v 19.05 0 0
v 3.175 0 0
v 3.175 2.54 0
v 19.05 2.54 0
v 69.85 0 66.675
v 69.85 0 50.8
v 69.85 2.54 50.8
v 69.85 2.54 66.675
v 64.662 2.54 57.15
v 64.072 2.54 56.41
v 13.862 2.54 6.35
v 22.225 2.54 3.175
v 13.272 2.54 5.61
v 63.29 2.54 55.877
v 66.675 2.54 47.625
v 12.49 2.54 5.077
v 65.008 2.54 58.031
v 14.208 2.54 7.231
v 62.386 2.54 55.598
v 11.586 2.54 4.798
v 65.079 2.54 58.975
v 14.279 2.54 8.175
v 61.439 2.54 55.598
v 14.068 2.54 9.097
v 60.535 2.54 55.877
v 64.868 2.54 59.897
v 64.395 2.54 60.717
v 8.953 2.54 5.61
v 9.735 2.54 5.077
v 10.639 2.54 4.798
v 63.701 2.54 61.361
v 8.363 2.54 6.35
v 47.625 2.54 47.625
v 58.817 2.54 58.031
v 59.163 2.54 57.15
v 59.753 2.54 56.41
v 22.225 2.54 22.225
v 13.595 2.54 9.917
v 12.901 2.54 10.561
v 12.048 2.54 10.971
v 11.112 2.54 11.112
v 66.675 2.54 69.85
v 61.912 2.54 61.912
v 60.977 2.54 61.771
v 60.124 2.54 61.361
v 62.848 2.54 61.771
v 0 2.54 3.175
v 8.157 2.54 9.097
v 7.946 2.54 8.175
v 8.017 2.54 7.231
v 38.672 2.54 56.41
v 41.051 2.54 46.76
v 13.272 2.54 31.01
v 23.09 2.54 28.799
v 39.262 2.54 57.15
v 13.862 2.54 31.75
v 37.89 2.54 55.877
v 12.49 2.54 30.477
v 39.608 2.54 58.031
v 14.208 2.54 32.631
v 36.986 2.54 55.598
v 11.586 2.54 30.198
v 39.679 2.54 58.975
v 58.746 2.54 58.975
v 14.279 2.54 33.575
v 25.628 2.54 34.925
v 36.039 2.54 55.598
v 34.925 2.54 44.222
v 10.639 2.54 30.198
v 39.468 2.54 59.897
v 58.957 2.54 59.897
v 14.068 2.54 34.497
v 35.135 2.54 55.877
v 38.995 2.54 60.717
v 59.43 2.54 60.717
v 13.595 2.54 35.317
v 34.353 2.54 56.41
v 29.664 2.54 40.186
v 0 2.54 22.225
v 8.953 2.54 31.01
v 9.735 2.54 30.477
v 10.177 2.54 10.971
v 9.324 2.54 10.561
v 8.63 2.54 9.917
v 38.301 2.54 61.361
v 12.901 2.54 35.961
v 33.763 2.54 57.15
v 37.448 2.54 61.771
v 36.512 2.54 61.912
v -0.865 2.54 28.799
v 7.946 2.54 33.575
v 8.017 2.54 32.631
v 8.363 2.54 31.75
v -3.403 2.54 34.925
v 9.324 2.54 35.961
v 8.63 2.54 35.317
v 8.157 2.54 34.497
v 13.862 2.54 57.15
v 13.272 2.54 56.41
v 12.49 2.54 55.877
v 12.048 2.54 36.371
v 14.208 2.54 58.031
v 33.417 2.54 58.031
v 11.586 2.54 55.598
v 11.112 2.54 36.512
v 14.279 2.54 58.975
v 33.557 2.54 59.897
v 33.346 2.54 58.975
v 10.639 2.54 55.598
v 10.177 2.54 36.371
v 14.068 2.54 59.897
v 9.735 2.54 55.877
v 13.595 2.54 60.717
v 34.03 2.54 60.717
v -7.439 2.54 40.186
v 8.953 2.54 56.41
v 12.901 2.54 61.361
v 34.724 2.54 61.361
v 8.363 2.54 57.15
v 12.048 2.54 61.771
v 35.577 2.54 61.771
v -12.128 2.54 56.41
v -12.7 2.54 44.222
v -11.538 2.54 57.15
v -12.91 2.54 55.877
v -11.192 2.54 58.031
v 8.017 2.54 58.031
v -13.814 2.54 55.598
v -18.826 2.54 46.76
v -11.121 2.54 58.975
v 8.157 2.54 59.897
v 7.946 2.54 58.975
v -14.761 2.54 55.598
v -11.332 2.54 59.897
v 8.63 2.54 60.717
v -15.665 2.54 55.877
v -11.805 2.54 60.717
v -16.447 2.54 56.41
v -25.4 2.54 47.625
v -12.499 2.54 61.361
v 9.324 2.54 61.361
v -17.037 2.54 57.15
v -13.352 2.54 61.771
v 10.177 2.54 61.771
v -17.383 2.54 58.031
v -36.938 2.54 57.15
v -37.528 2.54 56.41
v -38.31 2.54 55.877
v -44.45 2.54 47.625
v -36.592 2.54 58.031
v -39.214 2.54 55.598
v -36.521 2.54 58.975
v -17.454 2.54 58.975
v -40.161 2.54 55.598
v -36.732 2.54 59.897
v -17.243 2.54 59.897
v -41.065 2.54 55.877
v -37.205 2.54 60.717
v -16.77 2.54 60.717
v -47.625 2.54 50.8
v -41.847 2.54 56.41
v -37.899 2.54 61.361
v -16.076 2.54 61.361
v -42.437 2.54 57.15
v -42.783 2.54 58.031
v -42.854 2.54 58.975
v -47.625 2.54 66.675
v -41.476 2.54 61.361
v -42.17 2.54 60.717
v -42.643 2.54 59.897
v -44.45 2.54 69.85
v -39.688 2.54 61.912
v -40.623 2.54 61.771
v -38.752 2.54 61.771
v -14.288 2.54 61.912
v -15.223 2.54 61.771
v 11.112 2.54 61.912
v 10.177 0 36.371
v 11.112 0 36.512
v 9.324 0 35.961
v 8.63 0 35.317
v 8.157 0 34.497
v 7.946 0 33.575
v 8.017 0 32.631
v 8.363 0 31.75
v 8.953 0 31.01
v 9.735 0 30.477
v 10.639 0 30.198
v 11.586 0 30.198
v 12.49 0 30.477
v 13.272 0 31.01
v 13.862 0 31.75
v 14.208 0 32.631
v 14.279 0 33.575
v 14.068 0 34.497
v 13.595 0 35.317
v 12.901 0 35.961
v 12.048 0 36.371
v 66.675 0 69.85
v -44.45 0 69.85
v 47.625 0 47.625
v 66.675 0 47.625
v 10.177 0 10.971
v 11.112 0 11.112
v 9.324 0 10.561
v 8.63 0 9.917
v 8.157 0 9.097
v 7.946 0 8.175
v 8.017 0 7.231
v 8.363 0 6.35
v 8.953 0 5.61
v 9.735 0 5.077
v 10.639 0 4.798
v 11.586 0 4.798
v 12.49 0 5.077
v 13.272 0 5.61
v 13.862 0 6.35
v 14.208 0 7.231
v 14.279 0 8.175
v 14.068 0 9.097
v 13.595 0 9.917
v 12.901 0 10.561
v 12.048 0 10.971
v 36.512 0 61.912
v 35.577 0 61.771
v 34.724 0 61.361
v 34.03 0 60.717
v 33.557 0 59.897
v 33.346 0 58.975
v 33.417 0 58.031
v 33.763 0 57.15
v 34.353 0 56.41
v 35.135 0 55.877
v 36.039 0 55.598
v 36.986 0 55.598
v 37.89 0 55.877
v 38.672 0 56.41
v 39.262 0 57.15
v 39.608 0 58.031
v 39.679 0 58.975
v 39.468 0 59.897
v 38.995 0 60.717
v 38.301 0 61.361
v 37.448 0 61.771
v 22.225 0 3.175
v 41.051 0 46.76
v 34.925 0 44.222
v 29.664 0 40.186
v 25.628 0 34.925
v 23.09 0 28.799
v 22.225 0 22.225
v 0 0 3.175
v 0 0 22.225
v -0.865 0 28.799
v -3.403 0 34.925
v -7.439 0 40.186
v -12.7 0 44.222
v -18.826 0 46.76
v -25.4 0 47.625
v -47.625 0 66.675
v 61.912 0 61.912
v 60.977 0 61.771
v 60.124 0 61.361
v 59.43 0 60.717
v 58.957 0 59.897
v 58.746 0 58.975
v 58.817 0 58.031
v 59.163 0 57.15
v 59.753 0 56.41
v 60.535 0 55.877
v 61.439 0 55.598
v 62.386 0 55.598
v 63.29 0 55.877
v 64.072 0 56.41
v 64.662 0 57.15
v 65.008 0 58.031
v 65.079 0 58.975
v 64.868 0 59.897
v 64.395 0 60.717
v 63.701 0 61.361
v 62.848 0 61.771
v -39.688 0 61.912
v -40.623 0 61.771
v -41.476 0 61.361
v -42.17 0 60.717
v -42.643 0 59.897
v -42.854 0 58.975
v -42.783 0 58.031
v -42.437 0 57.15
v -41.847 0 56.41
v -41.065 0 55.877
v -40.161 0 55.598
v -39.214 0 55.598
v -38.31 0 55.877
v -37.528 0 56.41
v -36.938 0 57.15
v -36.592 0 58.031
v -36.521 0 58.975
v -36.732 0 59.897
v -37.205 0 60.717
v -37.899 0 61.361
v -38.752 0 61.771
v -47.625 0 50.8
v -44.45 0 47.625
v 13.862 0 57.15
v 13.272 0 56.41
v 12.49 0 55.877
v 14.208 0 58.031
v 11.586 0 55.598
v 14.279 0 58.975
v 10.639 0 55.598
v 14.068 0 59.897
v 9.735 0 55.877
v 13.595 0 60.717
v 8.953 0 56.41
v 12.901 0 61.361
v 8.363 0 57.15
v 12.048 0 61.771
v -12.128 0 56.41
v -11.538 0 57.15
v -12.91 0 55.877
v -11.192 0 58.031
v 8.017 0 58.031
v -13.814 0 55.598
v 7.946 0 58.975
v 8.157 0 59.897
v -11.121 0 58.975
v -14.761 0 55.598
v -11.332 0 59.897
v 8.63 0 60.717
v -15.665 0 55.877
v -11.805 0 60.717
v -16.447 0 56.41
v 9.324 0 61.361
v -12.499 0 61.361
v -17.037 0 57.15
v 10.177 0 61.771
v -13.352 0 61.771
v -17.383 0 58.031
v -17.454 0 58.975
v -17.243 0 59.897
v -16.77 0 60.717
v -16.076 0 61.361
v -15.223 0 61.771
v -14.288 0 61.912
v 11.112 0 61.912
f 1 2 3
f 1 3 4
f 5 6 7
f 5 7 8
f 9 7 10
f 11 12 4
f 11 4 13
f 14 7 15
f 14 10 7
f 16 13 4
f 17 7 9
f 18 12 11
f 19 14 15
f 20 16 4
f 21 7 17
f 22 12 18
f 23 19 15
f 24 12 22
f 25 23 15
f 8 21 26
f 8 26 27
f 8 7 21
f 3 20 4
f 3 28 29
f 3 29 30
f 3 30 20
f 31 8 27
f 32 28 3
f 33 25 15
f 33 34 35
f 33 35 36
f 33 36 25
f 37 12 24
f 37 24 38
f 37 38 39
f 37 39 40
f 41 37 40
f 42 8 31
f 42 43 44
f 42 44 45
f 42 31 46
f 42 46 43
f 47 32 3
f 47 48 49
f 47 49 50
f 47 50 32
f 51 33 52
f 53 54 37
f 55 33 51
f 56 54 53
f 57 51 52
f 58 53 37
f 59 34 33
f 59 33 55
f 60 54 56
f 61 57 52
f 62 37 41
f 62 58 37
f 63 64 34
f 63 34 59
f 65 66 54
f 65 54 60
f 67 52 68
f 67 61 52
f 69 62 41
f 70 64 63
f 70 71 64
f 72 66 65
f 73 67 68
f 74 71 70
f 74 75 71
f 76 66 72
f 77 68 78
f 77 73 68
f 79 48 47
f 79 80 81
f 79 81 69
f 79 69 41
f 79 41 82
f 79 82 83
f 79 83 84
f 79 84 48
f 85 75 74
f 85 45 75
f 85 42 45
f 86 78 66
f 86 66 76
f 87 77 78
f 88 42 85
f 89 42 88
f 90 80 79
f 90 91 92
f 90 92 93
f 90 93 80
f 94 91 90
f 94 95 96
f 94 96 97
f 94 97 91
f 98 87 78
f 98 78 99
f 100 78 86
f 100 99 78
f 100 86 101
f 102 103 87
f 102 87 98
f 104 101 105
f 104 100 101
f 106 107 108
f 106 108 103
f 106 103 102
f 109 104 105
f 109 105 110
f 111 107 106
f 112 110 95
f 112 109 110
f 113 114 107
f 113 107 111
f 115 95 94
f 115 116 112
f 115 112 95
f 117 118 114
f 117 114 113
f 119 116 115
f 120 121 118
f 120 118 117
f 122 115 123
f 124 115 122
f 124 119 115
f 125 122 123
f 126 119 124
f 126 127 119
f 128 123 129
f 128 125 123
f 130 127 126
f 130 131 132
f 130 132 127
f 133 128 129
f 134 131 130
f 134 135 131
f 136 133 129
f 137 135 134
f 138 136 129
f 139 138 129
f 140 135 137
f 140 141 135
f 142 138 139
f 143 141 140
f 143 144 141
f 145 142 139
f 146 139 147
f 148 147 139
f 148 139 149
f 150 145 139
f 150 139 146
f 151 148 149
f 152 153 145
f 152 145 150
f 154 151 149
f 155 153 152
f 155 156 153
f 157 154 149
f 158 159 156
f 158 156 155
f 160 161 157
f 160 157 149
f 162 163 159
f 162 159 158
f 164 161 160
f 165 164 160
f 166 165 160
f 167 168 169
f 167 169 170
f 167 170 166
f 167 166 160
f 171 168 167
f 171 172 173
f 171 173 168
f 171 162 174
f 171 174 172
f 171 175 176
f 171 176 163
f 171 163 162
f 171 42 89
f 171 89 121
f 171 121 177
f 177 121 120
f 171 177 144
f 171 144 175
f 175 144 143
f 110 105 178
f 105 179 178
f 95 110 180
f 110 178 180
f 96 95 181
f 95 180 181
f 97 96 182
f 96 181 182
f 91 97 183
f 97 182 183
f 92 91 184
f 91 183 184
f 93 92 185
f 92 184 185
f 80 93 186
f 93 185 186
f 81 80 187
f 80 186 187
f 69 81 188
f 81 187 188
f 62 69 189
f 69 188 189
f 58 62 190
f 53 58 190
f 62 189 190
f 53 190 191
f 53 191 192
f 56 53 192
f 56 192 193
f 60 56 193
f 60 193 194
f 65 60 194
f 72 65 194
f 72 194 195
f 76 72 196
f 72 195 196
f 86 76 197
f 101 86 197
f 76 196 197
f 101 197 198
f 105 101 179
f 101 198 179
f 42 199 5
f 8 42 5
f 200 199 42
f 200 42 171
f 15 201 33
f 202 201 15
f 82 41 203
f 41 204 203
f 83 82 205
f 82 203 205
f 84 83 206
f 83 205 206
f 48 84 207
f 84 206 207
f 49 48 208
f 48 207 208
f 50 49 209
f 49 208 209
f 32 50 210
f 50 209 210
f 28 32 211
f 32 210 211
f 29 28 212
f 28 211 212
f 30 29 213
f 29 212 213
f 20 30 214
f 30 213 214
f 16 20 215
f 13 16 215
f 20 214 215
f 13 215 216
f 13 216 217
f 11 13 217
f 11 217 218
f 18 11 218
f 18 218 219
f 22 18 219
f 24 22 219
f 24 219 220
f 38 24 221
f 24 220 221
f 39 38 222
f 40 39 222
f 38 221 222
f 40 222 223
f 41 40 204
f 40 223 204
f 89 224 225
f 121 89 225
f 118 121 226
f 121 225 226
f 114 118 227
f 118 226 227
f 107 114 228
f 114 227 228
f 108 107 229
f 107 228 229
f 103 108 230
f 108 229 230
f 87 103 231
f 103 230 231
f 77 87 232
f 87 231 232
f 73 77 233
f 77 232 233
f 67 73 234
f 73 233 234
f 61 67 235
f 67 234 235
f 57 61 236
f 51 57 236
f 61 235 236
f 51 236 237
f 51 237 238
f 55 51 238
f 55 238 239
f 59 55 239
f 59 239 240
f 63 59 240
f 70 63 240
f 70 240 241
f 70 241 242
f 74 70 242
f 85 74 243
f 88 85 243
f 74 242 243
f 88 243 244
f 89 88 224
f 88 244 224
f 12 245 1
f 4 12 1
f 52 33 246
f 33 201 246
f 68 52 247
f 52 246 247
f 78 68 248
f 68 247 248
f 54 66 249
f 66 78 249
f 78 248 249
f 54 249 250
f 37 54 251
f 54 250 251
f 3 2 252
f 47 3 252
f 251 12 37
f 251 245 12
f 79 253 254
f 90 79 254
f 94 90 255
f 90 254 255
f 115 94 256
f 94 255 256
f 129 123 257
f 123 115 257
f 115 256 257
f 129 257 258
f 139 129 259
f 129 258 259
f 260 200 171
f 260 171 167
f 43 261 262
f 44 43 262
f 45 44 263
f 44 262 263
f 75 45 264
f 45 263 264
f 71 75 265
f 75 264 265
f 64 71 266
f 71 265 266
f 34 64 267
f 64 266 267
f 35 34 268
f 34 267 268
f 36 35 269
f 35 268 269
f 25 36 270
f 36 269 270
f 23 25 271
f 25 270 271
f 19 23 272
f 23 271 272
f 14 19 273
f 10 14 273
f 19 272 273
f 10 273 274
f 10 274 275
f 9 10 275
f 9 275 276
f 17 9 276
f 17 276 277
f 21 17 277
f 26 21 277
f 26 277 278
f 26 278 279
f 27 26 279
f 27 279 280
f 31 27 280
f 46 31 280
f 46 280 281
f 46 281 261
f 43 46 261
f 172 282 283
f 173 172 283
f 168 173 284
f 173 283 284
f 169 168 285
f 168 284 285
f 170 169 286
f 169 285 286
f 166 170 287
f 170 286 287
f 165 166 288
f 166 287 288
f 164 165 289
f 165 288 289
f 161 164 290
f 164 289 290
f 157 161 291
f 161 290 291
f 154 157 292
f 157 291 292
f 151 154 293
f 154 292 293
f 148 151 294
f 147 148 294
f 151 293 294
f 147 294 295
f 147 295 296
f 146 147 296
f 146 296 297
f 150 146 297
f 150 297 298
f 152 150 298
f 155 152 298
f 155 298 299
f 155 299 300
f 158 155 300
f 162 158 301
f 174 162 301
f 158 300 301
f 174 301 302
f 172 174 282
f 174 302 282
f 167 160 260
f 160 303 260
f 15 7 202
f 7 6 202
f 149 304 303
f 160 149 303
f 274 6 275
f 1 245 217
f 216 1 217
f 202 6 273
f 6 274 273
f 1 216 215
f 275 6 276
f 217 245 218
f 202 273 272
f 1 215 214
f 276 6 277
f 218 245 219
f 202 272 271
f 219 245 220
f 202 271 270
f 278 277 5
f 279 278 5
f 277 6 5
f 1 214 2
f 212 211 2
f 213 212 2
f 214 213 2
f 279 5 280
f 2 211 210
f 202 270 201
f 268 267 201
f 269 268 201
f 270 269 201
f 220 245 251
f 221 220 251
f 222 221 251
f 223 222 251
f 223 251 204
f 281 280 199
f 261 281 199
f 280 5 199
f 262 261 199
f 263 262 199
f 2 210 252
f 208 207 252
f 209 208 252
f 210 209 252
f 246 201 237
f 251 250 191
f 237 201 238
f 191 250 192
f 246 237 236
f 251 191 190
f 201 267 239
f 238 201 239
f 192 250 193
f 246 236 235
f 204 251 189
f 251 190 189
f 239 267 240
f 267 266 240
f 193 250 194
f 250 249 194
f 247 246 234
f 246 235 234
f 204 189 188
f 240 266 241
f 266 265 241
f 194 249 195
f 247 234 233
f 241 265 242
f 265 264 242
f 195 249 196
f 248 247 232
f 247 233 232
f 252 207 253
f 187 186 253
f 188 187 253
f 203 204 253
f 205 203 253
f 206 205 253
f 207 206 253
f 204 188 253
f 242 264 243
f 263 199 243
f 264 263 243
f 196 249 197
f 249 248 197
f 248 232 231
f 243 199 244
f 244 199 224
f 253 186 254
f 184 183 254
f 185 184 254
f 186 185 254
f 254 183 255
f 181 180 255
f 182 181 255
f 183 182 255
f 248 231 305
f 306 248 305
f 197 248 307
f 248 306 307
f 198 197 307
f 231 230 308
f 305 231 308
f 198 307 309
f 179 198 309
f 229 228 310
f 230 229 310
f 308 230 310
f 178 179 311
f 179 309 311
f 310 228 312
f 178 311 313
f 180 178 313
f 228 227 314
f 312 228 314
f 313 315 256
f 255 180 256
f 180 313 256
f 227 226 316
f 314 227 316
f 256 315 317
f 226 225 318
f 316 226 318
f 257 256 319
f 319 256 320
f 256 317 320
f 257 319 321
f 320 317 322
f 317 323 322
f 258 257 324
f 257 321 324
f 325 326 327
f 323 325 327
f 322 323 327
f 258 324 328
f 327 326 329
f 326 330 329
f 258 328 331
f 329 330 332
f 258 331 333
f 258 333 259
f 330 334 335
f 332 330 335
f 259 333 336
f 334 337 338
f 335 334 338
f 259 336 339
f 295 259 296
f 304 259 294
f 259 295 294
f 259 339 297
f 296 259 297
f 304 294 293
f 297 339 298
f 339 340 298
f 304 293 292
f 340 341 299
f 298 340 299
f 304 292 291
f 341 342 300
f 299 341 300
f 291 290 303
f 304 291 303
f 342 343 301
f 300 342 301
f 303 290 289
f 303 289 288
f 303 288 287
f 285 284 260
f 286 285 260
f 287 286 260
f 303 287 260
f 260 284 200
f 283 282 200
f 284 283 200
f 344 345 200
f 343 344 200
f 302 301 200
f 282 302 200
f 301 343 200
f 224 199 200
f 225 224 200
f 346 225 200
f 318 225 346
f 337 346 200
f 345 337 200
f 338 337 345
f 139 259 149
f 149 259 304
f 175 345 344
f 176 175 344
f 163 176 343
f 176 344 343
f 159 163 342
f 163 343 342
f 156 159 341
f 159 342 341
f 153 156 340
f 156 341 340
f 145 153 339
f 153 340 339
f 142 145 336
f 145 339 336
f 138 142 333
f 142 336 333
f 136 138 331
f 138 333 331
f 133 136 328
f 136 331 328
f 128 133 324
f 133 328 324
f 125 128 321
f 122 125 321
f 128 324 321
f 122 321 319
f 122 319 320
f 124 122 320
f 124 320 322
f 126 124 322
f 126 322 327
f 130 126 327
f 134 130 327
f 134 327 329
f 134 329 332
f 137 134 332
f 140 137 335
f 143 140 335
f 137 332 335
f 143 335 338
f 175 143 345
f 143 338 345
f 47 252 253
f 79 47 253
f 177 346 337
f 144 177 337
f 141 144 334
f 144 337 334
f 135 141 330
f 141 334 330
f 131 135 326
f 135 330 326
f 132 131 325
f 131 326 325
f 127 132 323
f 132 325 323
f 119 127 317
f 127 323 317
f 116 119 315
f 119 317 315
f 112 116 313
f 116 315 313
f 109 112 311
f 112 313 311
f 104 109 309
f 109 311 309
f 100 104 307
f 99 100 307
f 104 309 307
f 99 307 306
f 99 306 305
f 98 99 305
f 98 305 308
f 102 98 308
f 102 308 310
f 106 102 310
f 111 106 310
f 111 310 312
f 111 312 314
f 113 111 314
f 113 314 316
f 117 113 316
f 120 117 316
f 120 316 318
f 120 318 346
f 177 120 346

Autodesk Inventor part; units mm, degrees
ref_plane "YZ Plane" through (0, 0, 0) normal (1, 0, 0) x (0, 1, 0)
ref_plane "XZ Plane" through (0, 0, 0) normal (0, 1, 0) x (-1, 0, 0)
ref_plane "XY Plane" through (0, 0, 0) normal (0, 0, 1) x (1, 0, 0)
sketch "Sketch1" plane through (0, 0, 0) normal (0, 1, 0) x (-1, 0, 0)
  line L0 (-3.175, 0) -> (-19.05, 0)
  line L1 (-69.85, 50.8) -> (-69.85, 66.675)
  line L2 (-66.675, 69.85) -> (44.45, 69.85)
  line L3 (-66.675, 69.85) -> (-69.85, 66.675)
  line L4 (-22.225, 3.175) -> (-22.225, 22.225)
  line L5 (-47.625, 47.625) -> (-66.675, 47.625)
  arc A0 (-22.225, 22.225) -> (-47.625, 47.625) centre (-47.625, 22.225) ccw
  line L6 (-22.225, 3.175) -> (-19.05, 0)
  line L7 (-69.85, 50.8) -> (-66.675, 47.625)
  line L8 (0, 3.175) -> (0, 22.225)
  line L9 (25.4, 47.625) -> (44.45, 47.625)
  line L10 (47.625, 50.8) -> (47.625, 66.675)
  arc A1 (25.4, 47.625) -> (0, 22.225) centre (25.4, 22.225) ccw
  line L11 (44.45, 69.85) -> (47.625, 66.675)
  line L12 (44.45, 47.625) -> (47.625, 50.8)
  line L13 (-3.175, 0) -> (0, 3.175)
  point P0 (0, 0)
  point P1 (-69.85, 69.85)
  point P2 (-3.175, 0)
  point P3 (0, 0)
  point P4 (-22.225, 47.625)
  point P5 (-22.225, 0)
  point P6 (-69.85, 47.625)
  point P7 (52.01, 70.1655)
  point P8 (52.01, 44.7655)
  point P9 (5.867, 46.0375)
  point P10 (5.867, 11.0567)
  point P11 (0, 47.625)
  point P12 (41.275, 47.625)
  point P13 (47.625, 44.45)
  point P14 (47.625, 63.5)
  point P15 (47.625, 69.85)
  point P16 (47.625, 47.625)
  point P17 (0, 0)
  dimension "d6" = 3.175
  dimension "d7" = 3.175
  dimension "d10" = 25.4
  dimension "d11" = 3.175
  dimension "d12" = 3.175
  dimension "d13" = 3.175
  dimension "d14" = 3.175
  dimension "d39" = 19.05
  dimension "d40" = 19.05
  dimension "d44" = 22.225
  dimension "d45" = 25.4
  dimension "d46" = 3.175
  dimension "d47" = 3.175
  dimension "d48" = 3.175
  dimension "d49" = 3.175
  dimension "d50" = 19.05
  dimension "d56" = 22.225
  dimension "d57" = 22.225
  dimension "d58" = 3.175
  dimension "d59" = 3.175
extrude "Extrusion1" add sketch "Sketch1" along normal blind 2.54
hole "Hole1" at (11.1125, 2.54, 58.7375) direction (0, -1, 0) diameter 6.35 end through all
pattern_linear "Rectangular Pattern1" count 5 spacing 25.4 along (1, 0, 0) of "Hole1" first direction both ways yes
pattern_linear "Rectangular Pattern2" count 3 spacing 25.4 along (0, 0, -1) of "Hole1"
equation "\"d6\" = d2"
equation "\"d7\" = d6"
equation "\"d12\" = d11"
equation "\"d13\" = d11"
equation "\"d14\" = d13"
equation "\"d39\" = d50"
equation "\"d40\" = d50"
equation "\"d47\" = d46"
equation "\"d48\" = d46"
equation "\"d49\" = d48"
equation "\"d57\" = d44"
equation "\"d59\" = d58"
equation "\"BendRadius\" = Thickness"
equation "\"BendReliefWidth\" = Thickness"
equation "\"BendReliefDepth\" = 0.5 * Thickness"
equation "\"CornerReliefSize\" = 4 * Thickness"
equation "\"MinimumRemnant\" = 2 * Thickness"
equation "\"TransitionRadius\" = BendRadius"
equation "\"JacobiRadiusSize\" = Thickness"
equation "\"GapSize\" = Thickness"
equation "\"Thickness\" = 3.048"
equation "\"d2\" = 3.175"
properties part number "3x5 T"
